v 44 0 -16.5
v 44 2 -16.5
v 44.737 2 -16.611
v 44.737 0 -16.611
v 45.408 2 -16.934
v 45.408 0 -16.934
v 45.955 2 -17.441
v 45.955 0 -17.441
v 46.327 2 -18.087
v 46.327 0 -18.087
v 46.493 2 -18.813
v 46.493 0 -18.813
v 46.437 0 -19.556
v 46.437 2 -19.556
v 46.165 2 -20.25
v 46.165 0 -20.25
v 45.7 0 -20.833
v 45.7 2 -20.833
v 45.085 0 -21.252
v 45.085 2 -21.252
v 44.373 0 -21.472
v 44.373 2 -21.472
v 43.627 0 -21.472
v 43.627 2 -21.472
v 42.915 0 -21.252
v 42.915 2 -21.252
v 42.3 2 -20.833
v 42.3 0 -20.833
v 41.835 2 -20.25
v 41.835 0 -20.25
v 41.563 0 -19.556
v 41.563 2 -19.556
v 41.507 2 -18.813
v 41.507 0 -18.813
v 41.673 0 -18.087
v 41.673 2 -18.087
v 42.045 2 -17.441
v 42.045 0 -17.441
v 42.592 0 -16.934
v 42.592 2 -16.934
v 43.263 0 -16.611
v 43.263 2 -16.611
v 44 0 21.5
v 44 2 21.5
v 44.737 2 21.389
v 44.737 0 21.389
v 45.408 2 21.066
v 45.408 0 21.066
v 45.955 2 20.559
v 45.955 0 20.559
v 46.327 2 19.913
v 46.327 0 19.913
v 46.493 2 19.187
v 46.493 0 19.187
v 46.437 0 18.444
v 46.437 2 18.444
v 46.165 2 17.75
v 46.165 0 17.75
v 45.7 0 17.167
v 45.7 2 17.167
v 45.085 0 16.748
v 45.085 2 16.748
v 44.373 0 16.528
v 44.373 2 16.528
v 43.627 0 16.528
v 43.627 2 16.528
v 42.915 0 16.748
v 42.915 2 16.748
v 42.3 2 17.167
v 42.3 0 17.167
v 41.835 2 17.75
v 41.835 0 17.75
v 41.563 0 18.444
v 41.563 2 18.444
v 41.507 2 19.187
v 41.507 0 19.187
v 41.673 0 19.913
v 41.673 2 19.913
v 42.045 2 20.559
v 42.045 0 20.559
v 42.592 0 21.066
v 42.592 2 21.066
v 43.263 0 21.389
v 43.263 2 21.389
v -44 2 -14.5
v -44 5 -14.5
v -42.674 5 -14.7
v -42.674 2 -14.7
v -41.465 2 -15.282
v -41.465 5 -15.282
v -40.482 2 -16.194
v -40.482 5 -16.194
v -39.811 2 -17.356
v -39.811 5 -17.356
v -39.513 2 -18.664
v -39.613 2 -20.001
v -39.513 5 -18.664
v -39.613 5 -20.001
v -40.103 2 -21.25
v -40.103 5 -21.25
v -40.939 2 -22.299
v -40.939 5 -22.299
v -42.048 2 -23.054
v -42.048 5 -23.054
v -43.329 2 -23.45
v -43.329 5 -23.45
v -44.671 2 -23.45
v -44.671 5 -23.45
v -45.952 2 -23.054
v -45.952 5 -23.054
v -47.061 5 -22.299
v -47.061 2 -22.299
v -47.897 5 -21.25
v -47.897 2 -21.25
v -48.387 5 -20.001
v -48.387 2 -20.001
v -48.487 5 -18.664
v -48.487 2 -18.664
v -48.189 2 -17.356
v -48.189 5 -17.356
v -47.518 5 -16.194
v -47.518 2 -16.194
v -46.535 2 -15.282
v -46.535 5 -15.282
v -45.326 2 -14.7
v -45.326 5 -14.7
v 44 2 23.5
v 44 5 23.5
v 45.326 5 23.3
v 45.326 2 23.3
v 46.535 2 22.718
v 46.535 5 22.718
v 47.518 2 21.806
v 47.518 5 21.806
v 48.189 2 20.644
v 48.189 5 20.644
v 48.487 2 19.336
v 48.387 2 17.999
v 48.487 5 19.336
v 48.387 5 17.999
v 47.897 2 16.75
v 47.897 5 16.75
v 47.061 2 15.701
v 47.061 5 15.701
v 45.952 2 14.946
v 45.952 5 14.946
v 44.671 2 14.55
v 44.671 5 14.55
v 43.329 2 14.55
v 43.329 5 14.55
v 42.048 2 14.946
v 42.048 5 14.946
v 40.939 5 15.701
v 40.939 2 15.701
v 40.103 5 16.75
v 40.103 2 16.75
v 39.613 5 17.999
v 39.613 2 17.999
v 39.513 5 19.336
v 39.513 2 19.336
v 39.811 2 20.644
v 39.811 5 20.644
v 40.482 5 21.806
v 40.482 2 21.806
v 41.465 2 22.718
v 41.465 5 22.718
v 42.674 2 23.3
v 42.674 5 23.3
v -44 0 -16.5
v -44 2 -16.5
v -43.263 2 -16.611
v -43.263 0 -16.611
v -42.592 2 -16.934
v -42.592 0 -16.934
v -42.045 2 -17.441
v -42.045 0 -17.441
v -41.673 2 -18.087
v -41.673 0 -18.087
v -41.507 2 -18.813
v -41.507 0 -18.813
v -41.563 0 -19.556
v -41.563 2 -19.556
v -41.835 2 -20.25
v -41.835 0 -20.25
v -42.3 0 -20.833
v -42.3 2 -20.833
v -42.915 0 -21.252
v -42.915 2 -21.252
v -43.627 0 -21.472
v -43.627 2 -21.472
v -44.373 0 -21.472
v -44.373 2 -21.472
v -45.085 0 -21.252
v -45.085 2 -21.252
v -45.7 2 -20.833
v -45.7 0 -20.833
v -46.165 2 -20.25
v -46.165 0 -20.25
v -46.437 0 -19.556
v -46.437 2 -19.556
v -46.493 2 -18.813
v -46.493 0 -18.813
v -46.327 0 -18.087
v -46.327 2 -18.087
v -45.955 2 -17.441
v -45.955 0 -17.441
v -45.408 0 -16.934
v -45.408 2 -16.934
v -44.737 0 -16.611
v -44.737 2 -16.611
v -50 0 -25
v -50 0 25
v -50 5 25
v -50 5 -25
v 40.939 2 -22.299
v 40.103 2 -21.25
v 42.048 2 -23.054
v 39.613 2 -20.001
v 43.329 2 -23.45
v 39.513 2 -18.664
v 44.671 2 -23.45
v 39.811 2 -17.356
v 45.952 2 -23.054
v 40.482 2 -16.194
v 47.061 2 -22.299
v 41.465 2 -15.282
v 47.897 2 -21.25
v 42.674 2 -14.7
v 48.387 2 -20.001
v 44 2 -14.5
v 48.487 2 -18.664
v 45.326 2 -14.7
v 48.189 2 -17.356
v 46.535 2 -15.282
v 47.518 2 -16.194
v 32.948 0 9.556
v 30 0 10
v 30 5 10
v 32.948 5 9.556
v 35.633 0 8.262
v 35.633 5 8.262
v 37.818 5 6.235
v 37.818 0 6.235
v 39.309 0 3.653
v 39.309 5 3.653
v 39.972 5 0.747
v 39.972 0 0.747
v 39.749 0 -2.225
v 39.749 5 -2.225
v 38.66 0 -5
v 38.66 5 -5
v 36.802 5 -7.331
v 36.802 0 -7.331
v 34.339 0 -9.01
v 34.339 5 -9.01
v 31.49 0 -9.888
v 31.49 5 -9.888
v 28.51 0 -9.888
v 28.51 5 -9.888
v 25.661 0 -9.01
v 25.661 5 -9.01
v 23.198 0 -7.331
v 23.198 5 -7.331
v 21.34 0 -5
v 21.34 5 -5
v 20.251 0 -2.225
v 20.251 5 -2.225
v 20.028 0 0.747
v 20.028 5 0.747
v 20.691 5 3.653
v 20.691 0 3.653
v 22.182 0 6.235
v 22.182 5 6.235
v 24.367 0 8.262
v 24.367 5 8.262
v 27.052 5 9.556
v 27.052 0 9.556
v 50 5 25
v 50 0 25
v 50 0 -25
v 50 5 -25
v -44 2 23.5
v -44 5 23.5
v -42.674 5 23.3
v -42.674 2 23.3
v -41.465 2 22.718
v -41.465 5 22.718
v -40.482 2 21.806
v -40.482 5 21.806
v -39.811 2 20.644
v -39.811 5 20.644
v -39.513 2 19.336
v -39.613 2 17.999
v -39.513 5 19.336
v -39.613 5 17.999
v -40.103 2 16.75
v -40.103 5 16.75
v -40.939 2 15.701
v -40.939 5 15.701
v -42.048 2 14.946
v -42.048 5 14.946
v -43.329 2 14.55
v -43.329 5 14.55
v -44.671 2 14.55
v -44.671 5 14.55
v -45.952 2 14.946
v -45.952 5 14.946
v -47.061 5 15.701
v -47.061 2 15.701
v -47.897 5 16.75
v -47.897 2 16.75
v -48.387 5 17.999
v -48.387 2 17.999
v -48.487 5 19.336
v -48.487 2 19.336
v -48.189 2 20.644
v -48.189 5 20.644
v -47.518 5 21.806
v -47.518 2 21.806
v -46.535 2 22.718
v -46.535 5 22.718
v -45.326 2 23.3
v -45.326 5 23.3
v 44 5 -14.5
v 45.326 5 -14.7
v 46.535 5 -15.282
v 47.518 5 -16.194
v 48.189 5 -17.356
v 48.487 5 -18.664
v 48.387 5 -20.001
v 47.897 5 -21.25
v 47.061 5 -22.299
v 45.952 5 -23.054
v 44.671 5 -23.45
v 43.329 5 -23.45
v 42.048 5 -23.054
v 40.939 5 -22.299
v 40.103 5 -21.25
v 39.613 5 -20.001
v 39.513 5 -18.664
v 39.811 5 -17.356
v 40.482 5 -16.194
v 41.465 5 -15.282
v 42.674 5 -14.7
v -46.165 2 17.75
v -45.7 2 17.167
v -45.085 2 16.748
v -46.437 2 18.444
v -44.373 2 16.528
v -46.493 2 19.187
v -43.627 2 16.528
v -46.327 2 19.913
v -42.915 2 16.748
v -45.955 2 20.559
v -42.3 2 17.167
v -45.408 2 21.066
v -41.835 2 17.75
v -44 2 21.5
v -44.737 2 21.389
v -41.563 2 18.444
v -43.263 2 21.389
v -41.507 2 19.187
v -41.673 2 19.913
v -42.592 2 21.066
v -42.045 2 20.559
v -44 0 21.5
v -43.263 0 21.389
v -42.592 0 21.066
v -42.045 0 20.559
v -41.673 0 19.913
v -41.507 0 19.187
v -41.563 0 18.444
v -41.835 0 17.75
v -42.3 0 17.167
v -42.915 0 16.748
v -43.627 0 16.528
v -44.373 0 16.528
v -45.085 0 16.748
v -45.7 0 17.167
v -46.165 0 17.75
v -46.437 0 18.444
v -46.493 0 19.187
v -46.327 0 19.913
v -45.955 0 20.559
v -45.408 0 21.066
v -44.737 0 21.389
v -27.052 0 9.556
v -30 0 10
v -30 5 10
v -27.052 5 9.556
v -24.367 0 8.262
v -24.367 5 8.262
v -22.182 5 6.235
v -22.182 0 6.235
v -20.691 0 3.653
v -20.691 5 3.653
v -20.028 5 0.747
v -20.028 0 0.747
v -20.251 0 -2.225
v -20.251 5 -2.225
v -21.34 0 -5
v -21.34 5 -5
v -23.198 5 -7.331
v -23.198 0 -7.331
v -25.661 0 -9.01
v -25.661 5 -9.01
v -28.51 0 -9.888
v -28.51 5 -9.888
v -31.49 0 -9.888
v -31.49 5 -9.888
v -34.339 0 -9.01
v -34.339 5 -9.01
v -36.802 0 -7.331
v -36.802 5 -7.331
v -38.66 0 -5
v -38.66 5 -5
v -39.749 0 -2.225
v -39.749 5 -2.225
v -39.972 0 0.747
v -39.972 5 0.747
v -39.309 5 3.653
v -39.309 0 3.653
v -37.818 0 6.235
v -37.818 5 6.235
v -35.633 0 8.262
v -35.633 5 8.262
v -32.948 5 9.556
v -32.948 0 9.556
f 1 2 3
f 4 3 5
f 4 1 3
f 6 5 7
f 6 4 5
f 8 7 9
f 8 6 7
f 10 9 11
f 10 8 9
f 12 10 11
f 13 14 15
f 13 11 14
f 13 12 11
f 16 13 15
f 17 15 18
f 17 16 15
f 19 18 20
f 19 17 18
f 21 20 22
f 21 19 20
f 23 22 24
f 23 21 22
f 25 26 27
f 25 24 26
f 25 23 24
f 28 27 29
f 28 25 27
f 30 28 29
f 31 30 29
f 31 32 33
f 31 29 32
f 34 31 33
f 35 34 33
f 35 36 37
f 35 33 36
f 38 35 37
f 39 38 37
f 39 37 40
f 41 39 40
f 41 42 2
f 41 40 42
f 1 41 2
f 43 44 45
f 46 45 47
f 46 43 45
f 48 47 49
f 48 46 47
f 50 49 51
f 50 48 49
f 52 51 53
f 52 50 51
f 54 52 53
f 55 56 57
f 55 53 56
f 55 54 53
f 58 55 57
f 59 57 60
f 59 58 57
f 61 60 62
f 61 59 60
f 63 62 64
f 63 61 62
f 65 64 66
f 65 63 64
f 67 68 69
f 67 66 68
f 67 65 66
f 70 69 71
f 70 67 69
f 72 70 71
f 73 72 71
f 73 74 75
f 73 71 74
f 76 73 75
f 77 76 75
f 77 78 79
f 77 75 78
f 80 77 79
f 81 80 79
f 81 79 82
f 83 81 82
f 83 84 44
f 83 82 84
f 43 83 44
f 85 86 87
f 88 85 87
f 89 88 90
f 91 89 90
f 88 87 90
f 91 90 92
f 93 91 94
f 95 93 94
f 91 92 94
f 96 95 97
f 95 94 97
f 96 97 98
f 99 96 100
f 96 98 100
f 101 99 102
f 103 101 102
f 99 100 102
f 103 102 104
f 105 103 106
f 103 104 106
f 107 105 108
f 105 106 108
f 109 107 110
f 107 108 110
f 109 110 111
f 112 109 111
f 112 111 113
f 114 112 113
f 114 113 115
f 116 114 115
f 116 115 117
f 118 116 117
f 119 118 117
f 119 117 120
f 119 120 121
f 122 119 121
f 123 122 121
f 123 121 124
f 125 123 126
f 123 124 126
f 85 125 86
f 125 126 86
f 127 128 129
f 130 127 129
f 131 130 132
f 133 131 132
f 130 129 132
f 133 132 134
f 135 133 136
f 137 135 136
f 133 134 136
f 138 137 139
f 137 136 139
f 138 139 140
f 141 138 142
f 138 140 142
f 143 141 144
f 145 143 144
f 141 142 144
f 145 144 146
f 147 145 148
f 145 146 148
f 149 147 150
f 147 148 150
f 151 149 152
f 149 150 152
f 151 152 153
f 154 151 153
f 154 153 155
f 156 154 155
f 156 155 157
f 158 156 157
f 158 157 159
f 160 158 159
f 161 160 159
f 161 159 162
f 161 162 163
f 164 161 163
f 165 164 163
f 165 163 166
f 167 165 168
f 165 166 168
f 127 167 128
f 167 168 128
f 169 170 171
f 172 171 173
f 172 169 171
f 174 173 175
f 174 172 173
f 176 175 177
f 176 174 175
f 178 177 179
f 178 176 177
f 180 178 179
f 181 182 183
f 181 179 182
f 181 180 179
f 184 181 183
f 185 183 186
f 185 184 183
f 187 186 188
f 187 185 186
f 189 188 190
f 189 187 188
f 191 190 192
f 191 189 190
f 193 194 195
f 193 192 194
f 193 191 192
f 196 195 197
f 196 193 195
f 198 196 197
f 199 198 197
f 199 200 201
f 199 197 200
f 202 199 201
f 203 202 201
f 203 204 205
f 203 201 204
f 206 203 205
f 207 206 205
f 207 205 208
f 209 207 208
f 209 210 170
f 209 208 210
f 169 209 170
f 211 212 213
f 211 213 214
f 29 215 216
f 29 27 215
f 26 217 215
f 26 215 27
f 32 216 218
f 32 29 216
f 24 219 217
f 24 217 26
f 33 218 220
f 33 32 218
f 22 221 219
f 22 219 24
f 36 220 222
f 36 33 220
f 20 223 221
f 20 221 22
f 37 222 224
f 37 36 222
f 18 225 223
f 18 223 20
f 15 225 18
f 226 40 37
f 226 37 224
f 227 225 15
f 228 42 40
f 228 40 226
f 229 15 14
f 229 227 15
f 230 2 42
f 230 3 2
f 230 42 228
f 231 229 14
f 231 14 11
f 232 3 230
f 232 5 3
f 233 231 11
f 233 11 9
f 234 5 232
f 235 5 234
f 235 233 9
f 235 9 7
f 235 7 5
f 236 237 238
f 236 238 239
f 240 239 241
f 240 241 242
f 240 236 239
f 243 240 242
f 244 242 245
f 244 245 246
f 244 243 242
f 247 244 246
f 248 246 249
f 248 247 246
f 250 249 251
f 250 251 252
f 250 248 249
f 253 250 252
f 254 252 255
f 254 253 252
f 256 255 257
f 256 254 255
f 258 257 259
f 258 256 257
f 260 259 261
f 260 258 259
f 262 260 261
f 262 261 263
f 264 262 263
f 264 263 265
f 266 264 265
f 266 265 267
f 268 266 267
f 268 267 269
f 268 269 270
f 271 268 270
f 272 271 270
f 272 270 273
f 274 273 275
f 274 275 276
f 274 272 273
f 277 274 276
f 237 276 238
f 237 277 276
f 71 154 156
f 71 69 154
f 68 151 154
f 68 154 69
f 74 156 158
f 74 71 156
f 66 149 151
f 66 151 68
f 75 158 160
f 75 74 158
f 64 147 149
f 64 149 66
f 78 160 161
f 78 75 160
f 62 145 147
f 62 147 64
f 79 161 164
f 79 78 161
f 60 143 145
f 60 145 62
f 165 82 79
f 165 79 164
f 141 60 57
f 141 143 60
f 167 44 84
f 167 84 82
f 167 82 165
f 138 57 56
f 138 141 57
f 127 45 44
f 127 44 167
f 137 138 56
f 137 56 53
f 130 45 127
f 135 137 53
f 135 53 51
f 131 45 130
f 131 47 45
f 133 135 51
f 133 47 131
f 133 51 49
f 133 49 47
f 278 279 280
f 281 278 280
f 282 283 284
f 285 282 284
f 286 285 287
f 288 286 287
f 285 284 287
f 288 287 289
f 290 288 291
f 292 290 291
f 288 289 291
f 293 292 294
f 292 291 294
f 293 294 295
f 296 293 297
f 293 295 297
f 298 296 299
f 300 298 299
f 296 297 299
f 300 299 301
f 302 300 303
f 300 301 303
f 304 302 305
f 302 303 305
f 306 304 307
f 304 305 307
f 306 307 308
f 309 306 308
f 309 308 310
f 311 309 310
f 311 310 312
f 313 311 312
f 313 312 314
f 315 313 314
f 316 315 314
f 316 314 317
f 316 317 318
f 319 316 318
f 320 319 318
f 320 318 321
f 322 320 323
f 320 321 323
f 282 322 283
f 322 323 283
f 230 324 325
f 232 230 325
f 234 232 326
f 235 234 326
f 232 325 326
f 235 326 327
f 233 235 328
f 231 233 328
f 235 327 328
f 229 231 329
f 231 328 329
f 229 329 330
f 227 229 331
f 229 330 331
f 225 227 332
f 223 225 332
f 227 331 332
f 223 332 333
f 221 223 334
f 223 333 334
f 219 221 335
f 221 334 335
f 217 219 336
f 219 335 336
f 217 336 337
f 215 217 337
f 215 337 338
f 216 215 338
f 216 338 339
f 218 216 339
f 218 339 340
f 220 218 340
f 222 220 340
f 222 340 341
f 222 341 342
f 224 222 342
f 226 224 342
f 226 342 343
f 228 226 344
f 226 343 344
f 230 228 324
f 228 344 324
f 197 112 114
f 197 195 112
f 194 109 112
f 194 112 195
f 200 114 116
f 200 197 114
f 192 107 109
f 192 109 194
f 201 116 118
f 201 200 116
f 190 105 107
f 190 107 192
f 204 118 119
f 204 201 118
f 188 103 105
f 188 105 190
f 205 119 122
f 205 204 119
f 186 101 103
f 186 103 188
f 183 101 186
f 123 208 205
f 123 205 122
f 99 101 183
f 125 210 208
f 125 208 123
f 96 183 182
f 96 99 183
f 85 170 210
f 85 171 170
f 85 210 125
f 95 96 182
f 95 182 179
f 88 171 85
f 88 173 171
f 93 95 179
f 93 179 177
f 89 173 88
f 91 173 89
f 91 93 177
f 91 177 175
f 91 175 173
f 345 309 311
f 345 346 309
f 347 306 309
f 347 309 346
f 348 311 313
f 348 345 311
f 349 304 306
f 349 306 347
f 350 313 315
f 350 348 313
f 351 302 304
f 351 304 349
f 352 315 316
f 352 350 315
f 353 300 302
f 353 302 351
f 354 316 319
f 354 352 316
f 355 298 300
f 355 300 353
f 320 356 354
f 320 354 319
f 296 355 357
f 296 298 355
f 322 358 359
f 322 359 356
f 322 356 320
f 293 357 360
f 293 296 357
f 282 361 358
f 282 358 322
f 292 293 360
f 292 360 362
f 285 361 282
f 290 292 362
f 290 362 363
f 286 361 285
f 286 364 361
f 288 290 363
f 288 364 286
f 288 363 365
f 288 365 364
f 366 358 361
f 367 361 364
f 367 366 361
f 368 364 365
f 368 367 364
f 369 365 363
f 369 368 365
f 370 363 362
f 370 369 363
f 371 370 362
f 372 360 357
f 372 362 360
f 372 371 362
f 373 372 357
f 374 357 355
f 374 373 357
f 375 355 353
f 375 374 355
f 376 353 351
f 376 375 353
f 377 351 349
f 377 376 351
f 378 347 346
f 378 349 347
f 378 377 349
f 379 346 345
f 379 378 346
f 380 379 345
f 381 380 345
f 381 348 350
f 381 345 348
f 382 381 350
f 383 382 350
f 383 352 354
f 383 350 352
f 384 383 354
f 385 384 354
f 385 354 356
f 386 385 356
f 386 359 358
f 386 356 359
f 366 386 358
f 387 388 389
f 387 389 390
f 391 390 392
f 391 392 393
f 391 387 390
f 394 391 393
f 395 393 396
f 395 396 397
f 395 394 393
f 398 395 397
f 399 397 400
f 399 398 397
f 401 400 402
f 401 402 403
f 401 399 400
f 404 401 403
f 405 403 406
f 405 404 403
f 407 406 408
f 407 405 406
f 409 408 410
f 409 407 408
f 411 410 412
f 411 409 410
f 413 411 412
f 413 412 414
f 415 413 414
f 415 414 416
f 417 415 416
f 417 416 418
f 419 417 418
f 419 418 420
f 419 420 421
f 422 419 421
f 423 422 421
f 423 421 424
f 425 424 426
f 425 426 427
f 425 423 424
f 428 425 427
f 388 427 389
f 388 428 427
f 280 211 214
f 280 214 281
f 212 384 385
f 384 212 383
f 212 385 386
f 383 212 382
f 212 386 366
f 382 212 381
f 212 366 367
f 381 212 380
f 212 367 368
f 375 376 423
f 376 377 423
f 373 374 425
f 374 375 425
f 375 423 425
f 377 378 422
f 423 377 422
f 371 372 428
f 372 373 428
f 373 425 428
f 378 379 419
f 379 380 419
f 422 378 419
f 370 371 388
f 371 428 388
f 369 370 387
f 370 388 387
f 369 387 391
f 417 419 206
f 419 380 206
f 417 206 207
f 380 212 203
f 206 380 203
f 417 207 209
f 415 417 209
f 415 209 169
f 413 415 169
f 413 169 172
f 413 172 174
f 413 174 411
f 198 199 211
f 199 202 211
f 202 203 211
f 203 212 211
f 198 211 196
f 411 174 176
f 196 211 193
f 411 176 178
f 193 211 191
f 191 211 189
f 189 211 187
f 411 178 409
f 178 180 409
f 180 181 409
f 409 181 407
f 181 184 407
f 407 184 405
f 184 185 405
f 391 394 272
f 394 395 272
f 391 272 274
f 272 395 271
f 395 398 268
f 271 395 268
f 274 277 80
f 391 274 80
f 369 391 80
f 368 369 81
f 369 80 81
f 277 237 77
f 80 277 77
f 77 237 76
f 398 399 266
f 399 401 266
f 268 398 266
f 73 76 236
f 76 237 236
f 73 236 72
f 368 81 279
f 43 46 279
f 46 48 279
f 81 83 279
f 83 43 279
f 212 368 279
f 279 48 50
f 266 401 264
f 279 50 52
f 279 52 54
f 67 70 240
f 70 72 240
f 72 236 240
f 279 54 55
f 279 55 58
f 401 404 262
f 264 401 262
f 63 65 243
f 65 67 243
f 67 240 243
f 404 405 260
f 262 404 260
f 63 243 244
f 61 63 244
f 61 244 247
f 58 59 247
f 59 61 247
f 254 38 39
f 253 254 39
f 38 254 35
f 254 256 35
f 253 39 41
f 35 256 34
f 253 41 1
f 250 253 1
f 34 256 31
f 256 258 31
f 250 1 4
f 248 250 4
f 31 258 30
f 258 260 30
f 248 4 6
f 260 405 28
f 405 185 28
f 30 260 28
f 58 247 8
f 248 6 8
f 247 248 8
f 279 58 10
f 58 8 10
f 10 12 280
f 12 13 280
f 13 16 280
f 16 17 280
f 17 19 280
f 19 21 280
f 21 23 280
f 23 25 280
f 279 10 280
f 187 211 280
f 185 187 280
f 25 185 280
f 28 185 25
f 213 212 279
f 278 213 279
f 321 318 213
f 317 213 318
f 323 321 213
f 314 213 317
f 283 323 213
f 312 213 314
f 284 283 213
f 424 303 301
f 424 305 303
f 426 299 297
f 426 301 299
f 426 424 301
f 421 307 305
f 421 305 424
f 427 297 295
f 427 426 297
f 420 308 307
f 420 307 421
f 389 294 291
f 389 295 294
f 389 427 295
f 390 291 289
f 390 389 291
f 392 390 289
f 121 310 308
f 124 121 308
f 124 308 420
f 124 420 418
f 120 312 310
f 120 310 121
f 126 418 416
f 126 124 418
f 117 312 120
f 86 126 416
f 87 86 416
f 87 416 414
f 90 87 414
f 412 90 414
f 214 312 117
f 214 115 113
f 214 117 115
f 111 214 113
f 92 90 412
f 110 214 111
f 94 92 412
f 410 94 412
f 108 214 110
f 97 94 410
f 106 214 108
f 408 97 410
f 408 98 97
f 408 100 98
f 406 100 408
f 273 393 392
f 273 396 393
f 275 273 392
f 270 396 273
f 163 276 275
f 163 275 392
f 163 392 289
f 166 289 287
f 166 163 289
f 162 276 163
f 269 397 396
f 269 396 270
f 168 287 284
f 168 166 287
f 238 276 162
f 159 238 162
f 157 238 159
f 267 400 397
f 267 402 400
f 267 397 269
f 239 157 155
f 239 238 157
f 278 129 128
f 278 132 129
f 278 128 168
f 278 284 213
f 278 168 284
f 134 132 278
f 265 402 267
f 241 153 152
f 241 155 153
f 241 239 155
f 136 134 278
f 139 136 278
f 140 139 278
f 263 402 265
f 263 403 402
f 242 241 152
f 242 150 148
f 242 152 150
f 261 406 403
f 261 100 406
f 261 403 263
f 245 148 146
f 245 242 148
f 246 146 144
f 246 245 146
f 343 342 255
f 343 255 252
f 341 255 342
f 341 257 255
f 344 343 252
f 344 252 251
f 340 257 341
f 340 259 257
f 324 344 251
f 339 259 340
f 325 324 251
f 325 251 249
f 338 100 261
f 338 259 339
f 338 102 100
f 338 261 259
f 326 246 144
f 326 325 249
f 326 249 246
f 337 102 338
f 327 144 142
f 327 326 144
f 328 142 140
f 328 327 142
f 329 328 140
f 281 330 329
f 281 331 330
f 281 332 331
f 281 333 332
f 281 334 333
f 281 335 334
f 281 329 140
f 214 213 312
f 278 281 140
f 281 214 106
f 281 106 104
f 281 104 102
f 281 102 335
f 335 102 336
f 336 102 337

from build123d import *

# Parameters (mm, degrees)
SKETCH1_W           = 100
SKETCH1_H           = 50
SKETCH1_R           = 10
SKETCH1_R_2         = 2.5
BOSS_EXTRUDE1_DEPTH = 5
SKETCH2_R           = 4.5
CUT_EXTRUDE1_DEPTH  = 3


with BuildPart() as part:
    # Sketch1 → Boss-Extrude1 (new body)
    with BuildSketch(Plane(origin=(0, 0, 0), x_dir=(1, 0, 0), z_dir=(0, 1, 0))):
        Rectangle(SKETCH1_W, SKETCH1_H)
        with Locations(Location((30, 0, 0), (0, 0, 270))):
            Circle(SKETCH1_R, mode=Mode.SUBTRACT)
        with Locations(Location((-30, 0, 0), (0, 0, 270))):
            Circle(SKETCH1_R, mode=Mode.SUBTRACT)
        with Locations(Location((44, 19, 0), (0, 0, 270))):
            Circle(SKETCH1_R_2, mode=Mode.SUBTRACT)
        with Locations(Location((-44, 19, 0), (0, 0, 270))):
            Circle(SKETCH1_R_2, mode=Mode.SUBTRACT)
        with Locations(Location((-44, -19, 0), (0, 0, 270))):
            Circle(SKETCH1_R_2, mode=Mode.SUBTRACT)
        with Locations(Location((44, -19, 0), (0, 0, 270))):
            Circle(SKETCH1_R_2, mode=Mode.SUBTRACT)
    extrude(amount=BOSS_EXTRUDE1_DEPTH)

    # Sketch2 → Cut-Extrude1 (cut)
    with BuildSketch(Plane(origin=(0, 5, 0), x_dir=(1, 0, 0), z_dir=(0, 1, 0))):
        with Locations(Location((-44, 19, 0), (0, 0, 270))):
            Circle(SKETCH2_R)
        with Locations(Location((-44, -19, 0), (0, 0, 270))):
            Circle(SKETCH2_R)
        with Locations(Location((44, -19, 0), (0, 0, 270))):
            Circle(SKETCH2_R)
        with Locations(Location((44, 19, 0), (0, 0, 270))):
            Circle(SKETCH2_R)
    extrude(amount=-CUT_EXTRUDE1_DEPTH, mode=Mode.SUBTRACT)


solid = part.part
